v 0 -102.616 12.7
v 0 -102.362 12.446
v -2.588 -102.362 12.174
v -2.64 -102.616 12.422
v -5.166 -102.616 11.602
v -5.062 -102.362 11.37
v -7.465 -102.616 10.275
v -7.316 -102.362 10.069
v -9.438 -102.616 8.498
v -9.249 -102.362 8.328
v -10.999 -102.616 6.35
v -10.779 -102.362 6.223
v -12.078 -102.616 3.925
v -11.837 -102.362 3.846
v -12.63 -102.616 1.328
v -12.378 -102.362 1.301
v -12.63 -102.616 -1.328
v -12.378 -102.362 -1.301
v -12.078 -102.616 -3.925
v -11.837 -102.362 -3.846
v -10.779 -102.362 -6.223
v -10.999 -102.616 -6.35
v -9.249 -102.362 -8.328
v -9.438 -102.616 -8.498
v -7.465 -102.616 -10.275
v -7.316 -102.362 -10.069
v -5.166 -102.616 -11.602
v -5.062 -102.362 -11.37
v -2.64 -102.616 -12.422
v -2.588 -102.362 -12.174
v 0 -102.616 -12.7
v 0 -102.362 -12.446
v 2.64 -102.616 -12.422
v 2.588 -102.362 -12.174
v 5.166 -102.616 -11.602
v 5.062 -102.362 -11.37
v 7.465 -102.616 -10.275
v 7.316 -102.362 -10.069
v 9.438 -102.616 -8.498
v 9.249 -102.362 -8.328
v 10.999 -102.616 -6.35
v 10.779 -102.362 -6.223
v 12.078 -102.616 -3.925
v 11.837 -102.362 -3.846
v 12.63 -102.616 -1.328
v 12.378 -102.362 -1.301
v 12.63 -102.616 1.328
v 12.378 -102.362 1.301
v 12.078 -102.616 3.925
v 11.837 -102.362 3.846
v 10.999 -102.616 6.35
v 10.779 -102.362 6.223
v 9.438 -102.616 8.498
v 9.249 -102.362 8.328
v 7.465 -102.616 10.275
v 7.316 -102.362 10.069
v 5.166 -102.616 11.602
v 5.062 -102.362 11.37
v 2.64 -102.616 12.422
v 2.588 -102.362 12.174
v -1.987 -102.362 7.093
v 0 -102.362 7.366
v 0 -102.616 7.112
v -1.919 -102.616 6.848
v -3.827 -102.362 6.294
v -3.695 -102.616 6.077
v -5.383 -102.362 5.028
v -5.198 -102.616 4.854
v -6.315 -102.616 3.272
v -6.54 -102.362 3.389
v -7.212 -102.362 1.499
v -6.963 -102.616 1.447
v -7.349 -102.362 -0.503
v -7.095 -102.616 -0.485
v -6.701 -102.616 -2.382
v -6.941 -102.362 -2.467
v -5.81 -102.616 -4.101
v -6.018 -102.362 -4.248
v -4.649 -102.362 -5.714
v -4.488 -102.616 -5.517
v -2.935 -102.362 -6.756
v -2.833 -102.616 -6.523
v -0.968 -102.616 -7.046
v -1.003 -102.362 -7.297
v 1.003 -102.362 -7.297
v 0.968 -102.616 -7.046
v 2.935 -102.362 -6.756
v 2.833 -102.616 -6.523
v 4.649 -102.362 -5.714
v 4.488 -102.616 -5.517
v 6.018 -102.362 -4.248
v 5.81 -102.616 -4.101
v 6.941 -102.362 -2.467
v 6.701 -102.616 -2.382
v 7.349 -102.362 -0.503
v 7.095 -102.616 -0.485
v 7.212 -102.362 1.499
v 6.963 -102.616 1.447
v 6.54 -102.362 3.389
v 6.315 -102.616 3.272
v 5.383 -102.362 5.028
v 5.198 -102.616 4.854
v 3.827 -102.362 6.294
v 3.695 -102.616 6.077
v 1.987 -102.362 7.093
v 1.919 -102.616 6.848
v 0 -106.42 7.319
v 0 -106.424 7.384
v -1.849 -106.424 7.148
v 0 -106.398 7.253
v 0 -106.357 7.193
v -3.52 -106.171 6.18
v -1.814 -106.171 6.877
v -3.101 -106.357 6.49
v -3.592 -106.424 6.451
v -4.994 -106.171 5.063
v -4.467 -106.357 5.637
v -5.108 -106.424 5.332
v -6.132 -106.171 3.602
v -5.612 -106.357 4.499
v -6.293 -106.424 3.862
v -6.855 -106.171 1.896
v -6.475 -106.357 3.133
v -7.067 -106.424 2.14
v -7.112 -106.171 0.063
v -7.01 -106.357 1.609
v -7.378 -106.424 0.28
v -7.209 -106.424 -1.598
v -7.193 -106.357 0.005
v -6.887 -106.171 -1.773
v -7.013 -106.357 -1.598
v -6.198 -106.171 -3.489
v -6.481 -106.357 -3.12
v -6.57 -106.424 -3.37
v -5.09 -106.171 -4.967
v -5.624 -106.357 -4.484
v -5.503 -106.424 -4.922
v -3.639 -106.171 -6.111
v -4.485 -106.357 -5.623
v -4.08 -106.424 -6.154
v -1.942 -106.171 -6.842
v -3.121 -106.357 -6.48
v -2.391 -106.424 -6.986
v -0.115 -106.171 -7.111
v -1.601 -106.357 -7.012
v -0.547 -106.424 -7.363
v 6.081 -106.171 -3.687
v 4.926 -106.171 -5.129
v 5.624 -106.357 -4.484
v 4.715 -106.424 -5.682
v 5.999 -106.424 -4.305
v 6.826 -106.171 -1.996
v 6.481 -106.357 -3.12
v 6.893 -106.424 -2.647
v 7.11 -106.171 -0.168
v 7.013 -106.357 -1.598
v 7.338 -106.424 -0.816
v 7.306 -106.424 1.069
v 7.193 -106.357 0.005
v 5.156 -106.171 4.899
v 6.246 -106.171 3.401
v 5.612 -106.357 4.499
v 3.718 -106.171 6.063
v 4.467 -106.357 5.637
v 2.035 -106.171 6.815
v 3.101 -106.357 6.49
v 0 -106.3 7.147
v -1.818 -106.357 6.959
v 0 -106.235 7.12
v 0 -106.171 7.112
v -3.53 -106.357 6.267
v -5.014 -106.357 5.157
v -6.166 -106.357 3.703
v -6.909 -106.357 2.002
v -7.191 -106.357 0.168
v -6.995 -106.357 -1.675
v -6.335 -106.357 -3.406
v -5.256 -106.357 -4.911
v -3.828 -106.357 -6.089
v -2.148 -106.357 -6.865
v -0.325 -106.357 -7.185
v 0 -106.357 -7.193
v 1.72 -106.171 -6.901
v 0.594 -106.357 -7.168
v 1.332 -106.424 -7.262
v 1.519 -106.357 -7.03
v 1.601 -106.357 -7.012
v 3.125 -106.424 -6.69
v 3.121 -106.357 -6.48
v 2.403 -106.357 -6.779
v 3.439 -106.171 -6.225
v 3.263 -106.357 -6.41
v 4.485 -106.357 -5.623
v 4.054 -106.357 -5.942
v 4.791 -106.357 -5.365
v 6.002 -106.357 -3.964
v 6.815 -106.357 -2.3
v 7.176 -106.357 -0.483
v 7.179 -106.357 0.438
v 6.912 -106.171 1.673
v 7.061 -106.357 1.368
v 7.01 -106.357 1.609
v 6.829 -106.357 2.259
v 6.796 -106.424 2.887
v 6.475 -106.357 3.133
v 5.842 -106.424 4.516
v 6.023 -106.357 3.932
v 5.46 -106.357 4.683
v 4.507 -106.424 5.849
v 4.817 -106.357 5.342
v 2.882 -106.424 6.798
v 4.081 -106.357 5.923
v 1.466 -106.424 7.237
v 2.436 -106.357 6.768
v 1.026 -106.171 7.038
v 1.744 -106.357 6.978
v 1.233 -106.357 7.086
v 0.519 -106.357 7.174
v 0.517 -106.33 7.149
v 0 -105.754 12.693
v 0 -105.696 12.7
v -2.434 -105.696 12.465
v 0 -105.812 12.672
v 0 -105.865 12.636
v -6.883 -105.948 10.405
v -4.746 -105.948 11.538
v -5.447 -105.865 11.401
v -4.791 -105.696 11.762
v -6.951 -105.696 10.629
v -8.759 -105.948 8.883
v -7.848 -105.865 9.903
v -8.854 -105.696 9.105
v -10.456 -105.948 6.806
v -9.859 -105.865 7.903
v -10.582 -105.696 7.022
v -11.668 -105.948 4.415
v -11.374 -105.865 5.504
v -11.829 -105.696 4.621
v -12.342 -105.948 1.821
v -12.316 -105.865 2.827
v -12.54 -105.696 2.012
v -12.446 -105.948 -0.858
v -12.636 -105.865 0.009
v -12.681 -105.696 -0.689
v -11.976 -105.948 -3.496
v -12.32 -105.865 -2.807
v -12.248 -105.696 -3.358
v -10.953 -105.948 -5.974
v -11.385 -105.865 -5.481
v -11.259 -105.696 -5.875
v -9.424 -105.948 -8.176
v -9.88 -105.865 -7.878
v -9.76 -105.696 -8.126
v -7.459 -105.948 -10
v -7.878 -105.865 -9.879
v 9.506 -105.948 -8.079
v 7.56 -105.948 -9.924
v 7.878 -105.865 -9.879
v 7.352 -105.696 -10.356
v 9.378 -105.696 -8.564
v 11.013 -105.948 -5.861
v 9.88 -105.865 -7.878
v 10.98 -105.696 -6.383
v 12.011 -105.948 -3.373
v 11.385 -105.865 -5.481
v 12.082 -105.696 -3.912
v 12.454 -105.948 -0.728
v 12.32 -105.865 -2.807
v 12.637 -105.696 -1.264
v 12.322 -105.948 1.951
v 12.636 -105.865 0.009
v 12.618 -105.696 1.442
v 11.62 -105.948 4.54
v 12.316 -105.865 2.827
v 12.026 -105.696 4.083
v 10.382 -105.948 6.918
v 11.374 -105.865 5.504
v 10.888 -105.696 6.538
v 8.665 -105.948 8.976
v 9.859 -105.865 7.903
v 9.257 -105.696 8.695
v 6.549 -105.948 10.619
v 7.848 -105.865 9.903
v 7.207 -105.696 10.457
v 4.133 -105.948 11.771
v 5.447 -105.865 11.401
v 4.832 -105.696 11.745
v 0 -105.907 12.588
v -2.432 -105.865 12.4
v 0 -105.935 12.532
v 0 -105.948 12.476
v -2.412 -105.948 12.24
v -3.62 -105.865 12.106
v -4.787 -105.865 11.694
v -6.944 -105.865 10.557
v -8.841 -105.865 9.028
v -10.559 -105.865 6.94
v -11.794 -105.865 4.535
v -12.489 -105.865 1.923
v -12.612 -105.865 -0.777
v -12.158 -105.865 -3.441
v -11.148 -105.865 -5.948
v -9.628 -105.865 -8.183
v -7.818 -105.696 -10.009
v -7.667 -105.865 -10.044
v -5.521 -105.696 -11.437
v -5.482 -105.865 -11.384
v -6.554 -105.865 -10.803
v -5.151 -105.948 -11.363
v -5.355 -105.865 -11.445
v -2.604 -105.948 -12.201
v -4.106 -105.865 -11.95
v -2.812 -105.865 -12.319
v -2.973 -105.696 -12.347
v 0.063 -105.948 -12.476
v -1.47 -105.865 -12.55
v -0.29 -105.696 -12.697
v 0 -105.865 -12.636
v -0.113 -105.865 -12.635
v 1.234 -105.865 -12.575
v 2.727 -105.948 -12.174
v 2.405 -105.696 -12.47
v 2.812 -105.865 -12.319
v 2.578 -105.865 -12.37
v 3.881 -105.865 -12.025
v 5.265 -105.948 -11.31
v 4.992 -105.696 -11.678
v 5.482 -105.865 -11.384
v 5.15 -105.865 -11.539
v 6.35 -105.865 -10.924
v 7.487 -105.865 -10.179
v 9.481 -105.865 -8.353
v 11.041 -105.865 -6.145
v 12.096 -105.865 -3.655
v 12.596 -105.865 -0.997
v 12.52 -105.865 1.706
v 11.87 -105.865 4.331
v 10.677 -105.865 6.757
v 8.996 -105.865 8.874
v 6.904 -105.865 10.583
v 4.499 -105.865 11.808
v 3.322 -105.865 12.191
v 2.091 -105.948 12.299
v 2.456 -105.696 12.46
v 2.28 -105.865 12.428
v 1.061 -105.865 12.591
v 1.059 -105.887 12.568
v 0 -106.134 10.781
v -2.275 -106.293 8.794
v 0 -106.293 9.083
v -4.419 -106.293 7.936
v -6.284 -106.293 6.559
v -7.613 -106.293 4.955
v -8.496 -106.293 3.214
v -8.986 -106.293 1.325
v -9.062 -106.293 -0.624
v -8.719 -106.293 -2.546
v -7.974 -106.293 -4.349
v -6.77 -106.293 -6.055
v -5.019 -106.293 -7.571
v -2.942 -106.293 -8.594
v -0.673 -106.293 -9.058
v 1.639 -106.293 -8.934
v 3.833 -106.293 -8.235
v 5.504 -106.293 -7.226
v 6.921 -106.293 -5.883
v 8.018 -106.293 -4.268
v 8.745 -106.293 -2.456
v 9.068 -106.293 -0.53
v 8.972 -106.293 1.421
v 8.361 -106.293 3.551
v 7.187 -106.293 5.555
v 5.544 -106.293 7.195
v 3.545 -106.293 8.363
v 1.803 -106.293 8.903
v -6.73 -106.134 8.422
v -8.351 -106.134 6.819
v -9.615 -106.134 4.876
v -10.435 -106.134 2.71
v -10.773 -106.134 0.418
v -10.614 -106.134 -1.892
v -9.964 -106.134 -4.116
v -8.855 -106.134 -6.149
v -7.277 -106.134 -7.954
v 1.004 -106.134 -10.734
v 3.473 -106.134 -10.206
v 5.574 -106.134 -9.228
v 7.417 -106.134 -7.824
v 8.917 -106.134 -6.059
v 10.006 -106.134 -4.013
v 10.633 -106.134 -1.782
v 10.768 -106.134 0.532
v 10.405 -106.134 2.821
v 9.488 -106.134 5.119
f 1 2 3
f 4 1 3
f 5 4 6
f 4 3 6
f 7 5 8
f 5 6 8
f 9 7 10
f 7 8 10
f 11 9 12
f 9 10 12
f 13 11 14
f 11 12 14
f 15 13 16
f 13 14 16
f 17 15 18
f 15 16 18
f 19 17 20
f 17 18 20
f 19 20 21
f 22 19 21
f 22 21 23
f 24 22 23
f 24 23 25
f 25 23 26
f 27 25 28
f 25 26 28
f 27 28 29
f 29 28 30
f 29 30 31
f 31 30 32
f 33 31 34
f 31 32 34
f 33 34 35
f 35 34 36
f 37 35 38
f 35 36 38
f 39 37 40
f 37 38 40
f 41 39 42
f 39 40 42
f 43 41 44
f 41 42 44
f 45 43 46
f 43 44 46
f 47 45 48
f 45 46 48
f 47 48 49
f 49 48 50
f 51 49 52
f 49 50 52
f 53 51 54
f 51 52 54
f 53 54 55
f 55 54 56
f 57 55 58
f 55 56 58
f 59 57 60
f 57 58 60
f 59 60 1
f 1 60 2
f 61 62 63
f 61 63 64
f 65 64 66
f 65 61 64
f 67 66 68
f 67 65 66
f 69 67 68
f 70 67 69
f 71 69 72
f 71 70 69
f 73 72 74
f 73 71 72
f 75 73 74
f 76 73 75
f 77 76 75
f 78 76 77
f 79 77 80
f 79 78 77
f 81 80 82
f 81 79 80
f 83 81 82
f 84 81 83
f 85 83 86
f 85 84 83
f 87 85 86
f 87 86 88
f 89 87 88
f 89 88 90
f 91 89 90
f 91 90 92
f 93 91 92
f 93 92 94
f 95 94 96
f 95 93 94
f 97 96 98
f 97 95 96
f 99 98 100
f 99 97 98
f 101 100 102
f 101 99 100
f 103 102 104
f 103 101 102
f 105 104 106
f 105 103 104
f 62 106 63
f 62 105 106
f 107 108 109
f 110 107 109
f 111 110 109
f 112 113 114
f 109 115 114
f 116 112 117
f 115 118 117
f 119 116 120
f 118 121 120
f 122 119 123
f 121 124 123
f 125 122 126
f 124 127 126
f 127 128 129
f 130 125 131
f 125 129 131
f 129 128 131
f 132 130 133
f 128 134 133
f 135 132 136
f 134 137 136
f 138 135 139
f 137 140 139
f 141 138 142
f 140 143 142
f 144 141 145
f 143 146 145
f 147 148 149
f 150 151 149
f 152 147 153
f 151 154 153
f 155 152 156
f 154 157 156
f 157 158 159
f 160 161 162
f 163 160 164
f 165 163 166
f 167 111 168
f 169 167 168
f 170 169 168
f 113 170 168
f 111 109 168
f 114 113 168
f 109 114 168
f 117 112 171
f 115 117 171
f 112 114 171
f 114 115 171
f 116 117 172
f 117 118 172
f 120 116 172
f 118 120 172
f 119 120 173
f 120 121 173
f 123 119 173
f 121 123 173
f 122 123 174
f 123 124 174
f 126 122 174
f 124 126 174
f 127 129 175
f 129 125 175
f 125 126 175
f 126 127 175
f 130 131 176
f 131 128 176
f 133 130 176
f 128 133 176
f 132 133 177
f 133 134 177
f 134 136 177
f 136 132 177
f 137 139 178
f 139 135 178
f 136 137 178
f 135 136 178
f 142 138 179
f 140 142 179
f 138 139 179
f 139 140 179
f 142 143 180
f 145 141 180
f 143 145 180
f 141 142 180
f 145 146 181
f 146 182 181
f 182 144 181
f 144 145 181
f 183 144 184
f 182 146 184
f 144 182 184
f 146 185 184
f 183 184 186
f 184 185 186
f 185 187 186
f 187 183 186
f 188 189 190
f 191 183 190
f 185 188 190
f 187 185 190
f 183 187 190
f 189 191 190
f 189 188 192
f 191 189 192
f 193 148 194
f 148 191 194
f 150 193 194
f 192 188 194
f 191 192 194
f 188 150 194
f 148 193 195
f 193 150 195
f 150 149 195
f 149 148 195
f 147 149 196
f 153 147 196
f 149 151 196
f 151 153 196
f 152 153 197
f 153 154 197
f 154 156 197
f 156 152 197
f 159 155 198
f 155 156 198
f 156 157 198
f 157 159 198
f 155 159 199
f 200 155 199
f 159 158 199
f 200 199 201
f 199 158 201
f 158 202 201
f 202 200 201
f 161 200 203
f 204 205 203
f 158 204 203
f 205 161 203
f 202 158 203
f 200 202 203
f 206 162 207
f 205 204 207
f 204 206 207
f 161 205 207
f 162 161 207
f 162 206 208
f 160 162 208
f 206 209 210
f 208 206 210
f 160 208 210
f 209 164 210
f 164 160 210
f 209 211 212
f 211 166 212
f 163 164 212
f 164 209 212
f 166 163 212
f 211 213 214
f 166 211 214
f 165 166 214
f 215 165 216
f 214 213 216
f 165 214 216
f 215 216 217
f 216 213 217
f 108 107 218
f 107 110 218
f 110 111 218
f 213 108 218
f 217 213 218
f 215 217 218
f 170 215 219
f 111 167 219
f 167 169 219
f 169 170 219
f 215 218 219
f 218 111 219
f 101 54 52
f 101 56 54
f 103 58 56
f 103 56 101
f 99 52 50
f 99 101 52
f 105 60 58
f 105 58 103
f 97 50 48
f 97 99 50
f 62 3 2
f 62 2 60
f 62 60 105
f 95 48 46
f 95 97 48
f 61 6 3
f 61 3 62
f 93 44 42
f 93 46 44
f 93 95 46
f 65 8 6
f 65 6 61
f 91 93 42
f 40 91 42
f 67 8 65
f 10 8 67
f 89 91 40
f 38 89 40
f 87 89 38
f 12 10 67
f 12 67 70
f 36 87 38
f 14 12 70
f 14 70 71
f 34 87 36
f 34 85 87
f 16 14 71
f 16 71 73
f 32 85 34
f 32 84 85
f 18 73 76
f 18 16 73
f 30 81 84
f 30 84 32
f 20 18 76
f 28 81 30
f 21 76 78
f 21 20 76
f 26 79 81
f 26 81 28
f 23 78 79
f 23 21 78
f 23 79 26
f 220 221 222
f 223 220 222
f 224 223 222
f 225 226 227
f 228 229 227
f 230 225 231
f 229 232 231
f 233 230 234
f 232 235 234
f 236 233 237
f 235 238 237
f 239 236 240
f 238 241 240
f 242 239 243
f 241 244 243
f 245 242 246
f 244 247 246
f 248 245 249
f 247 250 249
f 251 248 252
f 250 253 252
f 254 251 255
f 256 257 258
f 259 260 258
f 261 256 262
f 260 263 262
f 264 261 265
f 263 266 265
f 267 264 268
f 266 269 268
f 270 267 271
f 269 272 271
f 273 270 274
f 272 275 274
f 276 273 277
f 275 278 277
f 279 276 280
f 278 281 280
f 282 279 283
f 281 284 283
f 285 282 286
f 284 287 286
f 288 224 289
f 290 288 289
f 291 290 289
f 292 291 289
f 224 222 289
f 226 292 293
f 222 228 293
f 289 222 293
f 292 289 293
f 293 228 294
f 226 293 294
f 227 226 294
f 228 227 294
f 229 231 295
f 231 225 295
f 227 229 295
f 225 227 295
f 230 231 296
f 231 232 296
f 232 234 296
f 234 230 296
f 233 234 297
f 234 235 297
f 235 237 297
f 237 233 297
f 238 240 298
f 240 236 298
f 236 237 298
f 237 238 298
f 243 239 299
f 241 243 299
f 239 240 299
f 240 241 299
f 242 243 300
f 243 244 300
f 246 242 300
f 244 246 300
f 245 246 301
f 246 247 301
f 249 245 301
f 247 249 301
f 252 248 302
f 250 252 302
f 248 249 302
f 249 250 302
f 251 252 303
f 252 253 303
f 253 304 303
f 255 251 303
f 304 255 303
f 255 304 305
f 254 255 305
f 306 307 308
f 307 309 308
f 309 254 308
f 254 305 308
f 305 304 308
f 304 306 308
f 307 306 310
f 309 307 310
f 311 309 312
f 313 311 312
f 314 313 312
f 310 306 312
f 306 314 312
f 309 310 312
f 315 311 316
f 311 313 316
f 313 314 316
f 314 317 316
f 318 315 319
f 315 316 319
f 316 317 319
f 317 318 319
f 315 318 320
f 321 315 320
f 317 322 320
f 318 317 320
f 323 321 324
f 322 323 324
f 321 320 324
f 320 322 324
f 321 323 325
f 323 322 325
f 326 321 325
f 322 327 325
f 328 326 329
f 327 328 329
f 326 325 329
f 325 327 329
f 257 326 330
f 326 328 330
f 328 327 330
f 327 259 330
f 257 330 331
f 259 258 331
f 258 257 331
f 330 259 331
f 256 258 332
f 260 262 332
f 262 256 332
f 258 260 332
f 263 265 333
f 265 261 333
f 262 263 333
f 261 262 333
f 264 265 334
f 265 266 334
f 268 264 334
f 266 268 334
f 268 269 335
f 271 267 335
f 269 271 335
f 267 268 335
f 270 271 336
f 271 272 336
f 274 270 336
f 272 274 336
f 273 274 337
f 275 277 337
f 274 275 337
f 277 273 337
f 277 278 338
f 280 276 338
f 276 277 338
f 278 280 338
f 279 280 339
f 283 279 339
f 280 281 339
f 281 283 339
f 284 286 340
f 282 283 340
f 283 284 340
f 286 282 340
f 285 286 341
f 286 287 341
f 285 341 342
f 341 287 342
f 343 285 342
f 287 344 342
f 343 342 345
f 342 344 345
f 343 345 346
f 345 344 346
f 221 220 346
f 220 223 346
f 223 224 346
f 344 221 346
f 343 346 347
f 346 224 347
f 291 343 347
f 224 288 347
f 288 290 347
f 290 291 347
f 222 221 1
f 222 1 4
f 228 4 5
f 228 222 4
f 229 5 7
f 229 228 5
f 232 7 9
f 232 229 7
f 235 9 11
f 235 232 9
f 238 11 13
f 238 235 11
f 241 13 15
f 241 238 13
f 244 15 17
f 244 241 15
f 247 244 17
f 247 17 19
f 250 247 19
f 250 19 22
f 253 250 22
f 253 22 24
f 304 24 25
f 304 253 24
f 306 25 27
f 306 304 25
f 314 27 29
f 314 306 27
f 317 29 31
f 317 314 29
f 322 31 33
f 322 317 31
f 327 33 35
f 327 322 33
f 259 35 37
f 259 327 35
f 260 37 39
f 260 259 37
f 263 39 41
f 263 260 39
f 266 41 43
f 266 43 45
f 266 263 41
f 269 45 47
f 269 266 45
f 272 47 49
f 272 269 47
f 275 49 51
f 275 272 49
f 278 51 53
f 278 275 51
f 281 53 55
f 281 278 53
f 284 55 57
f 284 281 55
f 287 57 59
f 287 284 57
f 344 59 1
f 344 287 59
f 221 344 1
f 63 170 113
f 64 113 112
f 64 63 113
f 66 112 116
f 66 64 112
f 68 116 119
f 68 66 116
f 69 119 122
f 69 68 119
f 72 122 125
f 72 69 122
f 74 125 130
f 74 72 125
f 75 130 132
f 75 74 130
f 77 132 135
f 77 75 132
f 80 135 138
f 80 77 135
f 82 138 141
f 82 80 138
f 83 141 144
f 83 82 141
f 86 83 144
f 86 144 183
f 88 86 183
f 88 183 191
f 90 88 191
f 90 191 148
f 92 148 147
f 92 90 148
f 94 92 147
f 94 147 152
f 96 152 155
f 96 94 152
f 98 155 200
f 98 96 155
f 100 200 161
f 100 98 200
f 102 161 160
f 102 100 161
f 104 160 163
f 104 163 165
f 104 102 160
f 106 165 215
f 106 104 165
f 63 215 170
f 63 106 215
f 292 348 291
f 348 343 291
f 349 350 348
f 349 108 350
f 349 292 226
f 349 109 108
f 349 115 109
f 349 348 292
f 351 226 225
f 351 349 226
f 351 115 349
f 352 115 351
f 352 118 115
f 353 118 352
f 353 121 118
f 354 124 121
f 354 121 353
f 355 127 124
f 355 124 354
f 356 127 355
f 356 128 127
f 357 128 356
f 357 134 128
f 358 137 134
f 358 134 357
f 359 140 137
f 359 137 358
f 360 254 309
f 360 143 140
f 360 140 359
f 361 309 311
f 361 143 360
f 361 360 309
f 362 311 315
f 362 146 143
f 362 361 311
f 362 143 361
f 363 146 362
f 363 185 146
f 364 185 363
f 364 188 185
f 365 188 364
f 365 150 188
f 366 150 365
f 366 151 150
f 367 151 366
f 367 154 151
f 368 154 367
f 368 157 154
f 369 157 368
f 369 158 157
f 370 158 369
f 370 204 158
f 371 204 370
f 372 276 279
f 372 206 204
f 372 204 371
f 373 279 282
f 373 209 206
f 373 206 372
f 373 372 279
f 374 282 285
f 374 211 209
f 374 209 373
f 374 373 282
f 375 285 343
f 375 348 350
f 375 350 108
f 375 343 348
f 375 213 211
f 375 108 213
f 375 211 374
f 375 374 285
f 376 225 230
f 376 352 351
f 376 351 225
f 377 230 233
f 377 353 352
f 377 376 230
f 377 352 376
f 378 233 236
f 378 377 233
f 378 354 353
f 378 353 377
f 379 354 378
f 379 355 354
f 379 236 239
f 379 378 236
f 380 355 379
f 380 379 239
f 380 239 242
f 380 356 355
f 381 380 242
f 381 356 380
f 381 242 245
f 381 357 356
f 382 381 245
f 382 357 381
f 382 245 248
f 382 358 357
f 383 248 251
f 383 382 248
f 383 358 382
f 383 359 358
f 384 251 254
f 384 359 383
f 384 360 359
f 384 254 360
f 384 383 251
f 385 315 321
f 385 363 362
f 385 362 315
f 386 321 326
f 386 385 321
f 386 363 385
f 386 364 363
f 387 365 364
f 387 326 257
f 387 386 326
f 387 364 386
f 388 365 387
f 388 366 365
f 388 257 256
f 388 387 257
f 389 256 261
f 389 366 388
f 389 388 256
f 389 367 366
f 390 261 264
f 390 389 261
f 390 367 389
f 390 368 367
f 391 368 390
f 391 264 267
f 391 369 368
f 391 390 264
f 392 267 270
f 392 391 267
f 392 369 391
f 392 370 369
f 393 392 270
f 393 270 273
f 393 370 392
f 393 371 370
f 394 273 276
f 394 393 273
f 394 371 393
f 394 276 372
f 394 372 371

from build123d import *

# Parameters (mm, degrees)
CHAMFER1_SIZE = 0.254
FILLET4_R     = 0.254


with BuildPart() as part:
    # Sketch2 → Convex Revolve1 (revolve)
    with BuildSketch(Plane.XY, mode=Mode.PRIVATE) as convex_revolve1_sk:
        with BuildLine():
            Line((12.7, -102.362), (12.7, -105.921350067))
            ThreePointArc((12.7, -105.921350067), (9.909428815, -106.218763034), (7.112, -106.442669339))
            Line((7.112, -106.442669339), (7.112, -102.362))
            Line((7.112, -102.362), (12.7, -102.362))
        make_face()
    revolve(convex_revolve1_sk.sketch.rotate(Axis((0, 0, 0), (0, -1, 0)), 90), axis=Axis((0, 0, 0), (0, -1, 0)))  # turned: the seam where the file's is

    # Chamfer1
    chamfer1_edges = [part.edges().sort_by_distance(p)[0] for p in [
        (0, -102.362, -12.7),
        (0, -102.362, -7.112),
    ]]
    chamfer(chamfer1_edges, length=CHAMFER1_SIZE)

    # Fillet4
    fillet4_edges = [part.edges().sort_by_distance(p)[0] for p in [
        (0, -105.921350067, -12.7),
        (0, -106.442669339, -7.112),
    ]]
    fillet(fillet4_edges, radius=FILLET4_R)


solid = part.part
